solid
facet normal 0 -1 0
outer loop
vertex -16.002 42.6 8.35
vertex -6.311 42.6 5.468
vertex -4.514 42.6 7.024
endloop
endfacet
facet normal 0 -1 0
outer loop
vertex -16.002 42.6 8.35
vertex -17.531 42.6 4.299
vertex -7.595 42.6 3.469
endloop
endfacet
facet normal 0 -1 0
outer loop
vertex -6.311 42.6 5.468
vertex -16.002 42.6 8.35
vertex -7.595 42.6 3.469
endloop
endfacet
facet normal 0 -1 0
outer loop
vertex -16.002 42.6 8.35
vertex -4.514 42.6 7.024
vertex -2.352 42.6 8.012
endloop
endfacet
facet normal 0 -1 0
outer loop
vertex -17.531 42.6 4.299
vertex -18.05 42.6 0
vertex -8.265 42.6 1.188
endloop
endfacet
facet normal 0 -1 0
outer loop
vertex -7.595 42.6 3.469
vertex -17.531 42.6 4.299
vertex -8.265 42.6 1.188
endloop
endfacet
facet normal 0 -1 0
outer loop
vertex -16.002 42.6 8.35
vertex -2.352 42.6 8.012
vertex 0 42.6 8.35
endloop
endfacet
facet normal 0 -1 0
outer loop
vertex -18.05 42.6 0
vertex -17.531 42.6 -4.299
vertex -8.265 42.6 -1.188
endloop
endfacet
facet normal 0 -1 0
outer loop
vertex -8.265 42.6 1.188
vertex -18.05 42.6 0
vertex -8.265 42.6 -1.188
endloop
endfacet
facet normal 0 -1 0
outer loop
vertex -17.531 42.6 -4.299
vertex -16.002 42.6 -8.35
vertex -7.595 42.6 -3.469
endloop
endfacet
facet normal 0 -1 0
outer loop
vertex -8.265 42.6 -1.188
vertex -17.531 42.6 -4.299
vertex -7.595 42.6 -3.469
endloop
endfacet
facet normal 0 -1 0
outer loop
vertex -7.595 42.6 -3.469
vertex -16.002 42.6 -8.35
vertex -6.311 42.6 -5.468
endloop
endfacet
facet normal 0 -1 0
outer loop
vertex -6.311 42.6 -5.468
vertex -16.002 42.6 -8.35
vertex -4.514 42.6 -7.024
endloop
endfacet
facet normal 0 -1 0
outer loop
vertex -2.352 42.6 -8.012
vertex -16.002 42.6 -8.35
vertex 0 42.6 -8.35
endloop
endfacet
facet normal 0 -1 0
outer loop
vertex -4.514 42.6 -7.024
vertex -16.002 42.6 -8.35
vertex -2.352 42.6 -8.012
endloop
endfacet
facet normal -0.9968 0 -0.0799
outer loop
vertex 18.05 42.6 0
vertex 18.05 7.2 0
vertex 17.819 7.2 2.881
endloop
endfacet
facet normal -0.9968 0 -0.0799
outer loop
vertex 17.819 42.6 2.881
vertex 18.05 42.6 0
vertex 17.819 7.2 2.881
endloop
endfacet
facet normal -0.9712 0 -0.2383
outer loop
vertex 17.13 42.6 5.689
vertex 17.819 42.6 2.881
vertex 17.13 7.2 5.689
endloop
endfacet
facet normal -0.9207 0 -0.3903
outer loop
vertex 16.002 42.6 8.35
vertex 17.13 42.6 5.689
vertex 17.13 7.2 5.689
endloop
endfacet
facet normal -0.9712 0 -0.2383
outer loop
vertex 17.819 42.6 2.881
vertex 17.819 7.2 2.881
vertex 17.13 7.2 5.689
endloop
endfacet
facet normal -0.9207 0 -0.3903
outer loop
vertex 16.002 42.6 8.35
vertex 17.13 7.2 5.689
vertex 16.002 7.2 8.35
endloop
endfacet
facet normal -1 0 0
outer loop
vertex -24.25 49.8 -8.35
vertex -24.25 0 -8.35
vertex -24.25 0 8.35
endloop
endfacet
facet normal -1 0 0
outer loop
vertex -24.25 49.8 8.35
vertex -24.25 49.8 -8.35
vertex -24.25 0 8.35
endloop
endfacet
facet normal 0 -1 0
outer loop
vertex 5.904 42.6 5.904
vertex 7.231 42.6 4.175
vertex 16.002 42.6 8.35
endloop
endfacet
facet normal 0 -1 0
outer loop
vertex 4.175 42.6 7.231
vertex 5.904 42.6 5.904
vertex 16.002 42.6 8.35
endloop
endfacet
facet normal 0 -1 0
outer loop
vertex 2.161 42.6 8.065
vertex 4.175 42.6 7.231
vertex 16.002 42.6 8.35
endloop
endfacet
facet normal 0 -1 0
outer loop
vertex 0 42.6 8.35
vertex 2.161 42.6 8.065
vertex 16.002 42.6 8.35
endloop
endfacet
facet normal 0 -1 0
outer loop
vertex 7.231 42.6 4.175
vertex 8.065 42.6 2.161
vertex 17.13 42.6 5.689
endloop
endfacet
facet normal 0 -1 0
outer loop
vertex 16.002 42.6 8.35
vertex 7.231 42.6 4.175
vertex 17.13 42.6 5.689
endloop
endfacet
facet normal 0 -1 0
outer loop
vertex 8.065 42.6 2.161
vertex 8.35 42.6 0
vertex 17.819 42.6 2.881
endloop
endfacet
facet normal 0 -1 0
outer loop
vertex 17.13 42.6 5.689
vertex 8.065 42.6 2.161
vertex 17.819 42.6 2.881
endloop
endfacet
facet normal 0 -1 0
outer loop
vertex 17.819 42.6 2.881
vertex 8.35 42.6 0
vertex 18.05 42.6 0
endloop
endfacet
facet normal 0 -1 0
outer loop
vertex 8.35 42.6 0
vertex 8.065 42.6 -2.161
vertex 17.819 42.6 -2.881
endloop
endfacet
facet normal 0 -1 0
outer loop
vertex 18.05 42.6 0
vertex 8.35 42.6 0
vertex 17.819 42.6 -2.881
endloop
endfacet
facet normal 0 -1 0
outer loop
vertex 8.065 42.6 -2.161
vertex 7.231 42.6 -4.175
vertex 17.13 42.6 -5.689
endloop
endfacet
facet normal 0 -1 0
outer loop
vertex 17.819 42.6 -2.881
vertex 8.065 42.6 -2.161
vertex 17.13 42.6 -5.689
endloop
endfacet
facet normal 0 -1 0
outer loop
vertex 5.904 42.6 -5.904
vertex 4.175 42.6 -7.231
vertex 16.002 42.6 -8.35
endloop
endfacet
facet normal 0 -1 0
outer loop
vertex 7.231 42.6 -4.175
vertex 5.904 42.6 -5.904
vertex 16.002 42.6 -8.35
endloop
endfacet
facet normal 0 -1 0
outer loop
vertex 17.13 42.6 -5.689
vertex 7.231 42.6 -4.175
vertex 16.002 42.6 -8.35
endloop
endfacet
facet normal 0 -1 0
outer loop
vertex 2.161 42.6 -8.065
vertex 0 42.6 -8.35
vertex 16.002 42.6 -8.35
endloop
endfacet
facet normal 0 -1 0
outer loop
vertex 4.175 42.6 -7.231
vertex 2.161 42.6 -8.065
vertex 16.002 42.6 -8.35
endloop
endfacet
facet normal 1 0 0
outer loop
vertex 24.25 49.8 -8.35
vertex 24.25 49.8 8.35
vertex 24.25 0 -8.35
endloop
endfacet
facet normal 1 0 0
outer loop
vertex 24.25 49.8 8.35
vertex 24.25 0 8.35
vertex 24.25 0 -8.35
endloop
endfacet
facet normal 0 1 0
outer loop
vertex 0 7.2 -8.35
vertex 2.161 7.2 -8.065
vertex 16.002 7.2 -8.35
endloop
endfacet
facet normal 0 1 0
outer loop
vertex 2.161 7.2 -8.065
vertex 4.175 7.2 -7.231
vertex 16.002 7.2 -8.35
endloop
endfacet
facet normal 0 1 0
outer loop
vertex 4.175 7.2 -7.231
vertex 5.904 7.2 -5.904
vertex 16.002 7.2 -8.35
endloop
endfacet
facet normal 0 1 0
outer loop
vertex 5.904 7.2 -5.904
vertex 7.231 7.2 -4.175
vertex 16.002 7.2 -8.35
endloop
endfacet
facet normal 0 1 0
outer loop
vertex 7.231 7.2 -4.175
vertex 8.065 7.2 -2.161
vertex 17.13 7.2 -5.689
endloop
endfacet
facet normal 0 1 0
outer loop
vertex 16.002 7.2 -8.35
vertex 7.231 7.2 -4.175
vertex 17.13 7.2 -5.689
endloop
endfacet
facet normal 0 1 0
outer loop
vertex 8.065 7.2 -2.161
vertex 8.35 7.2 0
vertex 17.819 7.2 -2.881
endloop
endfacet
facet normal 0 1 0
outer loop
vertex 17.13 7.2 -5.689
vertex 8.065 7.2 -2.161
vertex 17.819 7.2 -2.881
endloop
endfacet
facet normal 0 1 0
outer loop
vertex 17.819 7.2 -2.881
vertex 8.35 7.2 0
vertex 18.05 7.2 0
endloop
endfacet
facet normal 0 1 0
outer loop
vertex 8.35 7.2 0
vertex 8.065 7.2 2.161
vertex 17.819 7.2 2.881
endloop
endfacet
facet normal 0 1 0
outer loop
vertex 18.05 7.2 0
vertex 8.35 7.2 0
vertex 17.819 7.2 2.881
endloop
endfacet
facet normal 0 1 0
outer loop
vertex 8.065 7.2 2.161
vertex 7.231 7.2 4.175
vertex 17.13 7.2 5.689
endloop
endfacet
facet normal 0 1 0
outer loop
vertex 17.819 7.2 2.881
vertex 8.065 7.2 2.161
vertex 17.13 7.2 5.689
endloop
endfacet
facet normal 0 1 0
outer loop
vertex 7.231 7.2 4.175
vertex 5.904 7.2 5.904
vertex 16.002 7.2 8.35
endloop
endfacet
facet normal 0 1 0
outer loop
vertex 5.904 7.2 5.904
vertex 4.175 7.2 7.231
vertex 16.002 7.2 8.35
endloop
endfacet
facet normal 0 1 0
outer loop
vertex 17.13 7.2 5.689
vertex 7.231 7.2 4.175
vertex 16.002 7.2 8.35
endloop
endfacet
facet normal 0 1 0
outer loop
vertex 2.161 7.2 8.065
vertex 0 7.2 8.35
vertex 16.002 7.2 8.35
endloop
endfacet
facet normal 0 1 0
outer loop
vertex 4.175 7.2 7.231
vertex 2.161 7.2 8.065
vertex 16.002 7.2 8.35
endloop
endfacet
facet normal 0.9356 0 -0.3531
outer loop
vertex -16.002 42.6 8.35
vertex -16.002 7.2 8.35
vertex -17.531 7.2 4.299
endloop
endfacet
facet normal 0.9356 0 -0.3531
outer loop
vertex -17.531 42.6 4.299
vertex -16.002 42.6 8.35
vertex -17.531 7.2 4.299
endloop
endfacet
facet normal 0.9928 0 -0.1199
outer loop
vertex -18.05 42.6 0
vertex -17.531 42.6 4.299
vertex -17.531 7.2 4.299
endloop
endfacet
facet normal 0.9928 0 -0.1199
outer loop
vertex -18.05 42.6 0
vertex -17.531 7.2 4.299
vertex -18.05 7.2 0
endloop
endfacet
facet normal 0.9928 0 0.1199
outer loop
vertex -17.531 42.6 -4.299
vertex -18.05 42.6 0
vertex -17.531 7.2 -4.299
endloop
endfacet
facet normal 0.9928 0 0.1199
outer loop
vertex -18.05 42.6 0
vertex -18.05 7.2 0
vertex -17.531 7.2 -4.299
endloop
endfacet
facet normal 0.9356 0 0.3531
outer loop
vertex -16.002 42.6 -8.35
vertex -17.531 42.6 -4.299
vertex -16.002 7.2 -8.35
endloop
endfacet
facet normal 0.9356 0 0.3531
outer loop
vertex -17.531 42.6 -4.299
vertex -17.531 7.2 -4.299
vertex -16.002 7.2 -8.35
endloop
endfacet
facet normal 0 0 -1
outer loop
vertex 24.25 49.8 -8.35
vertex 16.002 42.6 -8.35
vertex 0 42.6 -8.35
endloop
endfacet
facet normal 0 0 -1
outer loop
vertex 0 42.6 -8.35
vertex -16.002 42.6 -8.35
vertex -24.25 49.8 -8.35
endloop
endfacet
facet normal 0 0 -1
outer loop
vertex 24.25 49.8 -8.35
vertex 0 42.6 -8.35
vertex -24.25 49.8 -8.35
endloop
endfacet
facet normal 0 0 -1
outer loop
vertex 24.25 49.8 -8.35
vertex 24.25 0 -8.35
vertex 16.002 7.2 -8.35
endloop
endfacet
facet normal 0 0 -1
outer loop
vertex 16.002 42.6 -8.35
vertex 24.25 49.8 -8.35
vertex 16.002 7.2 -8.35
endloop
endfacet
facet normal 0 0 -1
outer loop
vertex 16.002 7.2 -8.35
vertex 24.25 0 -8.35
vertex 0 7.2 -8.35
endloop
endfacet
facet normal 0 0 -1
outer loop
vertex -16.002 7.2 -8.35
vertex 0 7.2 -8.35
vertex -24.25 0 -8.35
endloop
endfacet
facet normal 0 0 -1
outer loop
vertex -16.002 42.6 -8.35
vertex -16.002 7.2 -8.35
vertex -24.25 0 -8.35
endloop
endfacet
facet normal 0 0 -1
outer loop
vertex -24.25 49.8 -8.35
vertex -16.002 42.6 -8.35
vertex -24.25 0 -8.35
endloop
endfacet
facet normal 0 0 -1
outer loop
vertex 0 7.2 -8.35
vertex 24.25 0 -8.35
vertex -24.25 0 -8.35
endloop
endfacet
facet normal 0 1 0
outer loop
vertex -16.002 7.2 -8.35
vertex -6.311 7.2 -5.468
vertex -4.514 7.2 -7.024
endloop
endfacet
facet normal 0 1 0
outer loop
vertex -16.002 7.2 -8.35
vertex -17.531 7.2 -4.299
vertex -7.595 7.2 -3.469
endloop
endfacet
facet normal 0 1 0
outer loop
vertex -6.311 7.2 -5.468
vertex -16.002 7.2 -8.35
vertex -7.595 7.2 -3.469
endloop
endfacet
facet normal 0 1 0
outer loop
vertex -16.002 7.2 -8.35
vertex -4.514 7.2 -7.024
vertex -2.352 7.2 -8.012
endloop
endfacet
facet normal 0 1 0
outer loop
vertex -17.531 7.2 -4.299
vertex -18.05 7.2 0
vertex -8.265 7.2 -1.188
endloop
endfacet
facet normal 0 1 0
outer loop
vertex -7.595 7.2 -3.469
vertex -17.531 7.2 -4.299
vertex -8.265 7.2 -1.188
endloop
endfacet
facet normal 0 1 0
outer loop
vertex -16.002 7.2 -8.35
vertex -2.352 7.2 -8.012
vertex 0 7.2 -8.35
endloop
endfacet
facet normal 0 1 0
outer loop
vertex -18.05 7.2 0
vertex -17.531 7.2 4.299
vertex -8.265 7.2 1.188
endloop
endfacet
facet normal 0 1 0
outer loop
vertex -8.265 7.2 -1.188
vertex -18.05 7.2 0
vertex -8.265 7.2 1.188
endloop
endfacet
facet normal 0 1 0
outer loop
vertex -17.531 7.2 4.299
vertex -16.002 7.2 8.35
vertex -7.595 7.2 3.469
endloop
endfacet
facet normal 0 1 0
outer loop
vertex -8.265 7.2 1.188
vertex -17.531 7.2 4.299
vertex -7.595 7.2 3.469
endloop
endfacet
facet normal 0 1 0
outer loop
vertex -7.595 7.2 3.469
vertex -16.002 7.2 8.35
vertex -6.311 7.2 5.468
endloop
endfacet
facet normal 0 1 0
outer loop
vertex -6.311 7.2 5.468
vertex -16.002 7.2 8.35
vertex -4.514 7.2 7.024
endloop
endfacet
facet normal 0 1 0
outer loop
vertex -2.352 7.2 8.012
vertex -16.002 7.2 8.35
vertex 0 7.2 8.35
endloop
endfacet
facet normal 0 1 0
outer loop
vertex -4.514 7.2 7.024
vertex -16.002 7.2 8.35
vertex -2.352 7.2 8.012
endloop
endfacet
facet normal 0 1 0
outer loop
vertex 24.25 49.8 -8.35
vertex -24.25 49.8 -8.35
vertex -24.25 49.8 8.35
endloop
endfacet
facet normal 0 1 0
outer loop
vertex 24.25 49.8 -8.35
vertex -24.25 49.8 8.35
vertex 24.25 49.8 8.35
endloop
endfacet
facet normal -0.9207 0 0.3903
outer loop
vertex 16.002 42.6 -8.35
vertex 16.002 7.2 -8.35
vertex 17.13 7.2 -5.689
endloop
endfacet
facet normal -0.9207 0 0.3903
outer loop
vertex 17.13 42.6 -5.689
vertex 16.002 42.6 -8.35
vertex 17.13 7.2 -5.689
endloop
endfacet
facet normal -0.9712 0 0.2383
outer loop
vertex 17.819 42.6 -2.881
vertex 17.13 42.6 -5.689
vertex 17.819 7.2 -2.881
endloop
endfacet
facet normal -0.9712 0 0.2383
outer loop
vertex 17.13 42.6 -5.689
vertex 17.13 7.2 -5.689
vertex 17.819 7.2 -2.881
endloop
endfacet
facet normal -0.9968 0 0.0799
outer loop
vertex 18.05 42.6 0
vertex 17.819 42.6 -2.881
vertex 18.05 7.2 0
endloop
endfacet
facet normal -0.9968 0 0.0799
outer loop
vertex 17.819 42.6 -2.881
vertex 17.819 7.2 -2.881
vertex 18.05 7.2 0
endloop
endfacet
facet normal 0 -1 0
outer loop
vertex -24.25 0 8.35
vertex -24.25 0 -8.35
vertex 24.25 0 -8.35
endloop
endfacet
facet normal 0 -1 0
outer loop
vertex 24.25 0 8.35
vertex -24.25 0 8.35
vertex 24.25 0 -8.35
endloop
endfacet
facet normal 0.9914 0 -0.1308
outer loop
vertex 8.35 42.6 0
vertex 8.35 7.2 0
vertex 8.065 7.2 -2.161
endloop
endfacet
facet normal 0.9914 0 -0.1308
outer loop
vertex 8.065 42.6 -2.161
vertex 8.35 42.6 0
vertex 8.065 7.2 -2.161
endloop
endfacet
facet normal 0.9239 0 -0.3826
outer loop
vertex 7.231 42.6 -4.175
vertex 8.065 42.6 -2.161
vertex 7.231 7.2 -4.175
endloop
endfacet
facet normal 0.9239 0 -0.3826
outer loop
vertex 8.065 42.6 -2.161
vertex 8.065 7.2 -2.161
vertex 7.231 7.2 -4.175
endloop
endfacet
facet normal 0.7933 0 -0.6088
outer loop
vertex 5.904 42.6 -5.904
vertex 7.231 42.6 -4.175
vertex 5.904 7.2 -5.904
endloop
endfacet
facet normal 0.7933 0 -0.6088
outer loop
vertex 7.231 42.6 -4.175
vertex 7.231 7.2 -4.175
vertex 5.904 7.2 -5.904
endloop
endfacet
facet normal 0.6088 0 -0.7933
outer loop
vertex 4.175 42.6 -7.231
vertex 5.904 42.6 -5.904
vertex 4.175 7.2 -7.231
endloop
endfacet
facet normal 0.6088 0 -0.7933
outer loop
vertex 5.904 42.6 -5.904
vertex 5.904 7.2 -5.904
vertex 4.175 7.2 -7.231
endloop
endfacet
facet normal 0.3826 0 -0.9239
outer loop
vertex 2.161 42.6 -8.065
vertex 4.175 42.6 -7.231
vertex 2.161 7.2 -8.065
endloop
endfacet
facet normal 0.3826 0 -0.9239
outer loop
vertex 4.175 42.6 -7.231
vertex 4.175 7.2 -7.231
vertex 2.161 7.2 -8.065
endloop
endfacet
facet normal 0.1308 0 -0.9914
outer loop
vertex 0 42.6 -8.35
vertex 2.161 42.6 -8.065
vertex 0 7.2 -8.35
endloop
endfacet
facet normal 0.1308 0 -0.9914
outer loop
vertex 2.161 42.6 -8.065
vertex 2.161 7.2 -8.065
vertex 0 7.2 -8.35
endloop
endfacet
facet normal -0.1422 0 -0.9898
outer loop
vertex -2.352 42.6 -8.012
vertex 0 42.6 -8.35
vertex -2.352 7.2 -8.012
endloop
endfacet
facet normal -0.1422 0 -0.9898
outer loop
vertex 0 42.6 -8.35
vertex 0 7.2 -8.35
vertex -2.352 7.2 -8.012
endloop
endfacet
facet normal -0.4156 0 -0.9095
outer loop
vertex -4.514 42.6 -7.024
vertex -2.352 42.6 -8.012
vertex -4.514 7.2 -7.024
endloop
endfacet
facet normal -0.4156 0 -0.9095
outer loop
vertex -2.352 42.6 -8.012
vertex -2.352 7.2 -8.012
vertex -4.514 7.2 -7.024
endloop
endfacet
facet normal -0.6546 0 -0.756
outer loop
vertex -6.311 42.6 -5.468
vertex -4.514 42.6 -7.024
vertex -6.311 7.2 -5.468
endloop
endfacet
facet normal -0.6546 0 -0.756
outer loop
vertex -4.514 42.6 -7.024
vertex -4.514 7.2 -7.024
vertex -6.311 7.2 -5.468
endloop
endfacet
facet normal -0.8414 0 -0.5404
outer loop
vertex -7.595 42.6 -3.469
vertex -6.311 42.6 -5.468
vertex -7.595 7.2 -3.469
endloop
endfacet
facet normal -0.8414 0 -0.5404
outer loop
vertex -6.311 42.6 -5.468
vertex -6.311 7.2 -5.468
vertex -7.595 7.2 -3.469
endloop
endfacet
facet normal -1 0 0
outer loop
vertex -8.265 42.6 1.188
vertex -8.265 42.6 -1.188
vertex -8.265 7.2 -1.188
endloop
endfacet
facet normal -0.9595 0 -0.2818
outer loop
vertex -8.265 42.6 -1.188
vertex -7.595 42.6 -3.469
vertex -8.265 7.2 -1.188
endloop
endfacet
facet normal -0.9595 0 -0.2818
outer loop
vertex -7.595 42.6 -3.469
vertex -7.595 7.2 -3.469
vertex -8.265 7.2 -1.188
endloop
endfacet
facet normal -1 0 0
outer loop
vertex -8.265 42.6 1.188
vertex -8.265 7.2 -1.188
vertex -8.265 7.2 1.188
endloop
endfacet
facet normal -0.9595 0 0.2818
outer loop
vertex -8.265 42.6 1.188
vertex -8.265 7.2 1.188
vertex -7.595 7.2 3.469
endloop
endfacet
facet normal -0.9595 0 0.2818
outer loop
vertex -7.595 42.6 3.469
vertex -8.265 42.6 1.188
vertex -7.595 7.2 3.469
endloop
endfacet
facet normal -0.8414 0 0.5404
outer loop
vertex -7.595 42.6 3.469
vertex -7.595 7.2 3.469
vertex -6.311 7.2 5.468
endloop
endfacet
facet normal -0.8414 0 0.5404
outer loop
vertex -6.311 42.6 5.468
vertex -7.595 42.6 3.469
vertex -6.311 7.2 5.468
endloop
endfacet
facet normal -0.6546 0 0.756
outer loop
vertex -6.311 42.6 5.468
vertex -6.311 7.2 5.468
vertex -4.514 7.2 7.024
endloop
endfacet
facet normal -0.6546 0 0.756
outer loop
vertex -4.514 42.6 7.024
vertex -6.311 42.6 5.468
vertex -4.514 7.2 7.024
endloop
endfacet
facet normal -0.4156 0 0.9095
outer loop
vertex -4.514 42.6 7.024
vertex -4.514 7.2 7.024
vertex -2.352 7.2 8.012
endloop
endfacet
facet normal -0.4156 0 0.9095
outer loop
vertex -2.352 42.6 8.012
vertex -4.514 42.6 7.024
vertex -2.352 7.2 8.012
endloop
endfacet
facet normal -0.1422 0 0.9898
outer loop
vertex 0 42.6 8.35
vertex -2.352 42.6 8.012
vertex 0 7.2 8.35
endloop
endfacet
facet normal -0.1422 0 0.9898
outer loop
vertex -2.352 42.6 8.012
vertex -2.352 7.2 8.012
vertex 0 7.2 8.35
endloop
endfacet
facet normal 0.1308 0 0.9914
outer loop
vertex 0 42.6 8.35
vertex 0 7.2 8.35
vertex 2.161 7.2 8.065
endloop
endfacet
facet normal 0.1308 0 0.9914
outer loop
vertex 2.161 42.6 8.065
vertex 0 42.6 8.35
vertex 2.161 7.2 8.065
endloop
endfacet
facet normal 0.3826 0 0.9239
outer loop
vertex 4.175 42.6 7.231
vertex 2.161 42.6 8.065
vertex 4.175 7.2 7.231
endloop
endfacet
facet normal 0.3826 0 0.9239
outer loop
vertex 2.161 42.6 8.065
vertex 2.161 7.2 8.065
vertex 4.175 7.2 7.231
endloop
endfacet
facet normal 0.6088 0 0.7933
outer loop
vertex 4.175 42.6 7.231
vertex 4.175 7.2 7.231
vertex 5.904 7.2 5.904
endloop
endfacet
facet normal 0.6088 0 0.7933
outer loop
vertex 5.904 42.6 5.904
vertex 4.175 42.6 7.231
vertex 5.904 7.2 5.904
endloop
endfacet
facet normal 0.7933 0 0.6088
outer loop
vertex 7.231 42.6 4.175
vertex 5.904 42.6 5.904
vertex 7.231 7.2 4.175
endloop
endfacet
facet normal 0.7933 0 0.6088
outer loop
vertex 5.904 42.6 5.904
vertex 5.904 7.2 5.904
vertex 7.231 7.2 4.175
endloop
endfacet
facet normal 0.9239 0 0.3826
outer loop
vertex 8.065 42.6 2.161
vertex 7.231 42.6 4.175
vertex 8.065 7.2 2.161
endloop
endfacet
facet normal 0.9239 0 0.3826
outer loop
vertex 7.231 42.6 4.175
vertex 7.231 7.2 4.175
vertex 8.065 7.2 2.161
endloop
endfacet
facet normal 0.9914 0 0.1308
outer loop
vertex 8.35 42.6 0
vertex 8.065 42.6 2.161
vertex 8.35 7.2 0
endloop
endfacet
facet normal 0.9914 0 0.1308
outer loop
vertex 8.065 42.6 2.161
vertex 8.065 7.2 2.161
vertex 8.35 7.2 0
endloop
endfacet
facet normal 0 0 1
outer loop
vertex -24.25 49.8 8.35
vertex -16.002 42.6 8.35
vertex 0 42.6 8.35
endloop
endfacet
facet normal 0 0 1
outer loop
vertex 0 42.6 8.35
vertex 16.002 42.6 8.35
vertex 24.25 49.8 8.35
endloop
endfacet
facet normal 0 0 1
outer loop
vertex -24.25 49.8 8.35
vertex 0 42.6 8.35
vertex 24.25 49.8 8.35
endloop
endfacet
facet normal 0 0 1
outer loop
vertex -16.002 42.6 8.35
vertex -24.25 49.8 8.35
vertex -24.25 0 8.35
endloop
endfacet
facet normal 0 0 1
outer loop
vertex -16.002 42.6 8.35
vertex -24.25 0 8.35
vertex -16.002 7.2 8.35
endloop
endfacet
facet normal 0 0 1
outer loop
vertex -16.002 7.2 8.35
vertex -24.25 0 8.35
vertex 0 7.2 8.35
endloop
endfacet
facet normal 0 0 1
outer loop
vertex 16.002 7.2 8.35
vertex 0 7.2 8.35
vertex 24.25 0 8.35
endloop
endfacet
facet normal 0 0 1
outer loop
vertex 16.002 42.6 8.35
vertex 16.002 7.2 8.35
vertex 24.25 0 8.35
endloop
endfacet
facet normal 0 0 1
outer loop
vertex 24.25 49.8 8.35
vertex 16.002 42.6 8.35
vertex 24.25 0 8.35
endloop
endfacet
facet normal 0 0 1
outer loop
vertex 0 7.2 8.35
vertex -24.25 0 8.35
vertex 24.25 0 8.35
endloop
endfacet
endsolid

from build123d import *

# Parameters (mm, degrees)
BOSS_EXTRUDE1_DEPTH   = 49.8
SKETCH1_R             = 8.35
BOSS_EXTRUDE1_2_DEPTH = 49.8
BOSS_EXTRUDE1_3_DEPTH = 49.8
SKETCH2_W             = 48.5
SKETCH2_H             = 16.7
BOSS_EXTRUDE2_DEPTH   = 7.2
SKETCH3_W             = 48.5
SKETCH3_H             = 16.7
BOSS_EXTRUDE3_DEPTH   = 7.2


with BuildPart() as part:
    # Sketch1 → Boss-Extrude1 (new body)
    with BuildSketch(Plane(origin=(0, 0, 0), x_dir=(1, 0, 0), z_dir=(0, 1, 0))):
        with BuildLine():
            Line((-16.002499805, 8.35), (-24.25, 8.35))
            Line((-24.25, 8.35), (-24.25, -8.35))
            Line((-24.25, -8.35), (-16.002499805, -8.35))
            ThreePointArc((-16.002499805, -8.35), (-18.05, 0), (-16.002499805, 8.35))
        make_face()
    extrude(amount=BOSS_EXTRUDE1_DEPTH)



with BuildPart() as body_2:
    # Sketch1 → Boss-Extrude1 2 (new body)
    with BuildSketch(Plane(origin=(0, 0, 0), x_dir=(1, 0, 0), z_dir=(0, 1, 0))):
        Circle(SKETCH1_R)
    extrude(amount=BOSS_EXTRUDE1_2_DEPTH)


with BuildPart() as body_3:
    # Sketch1 → Boss-Extrude1 3 (new body)
    with BuildSketch(Plane(origin=(0, 0, 0), x_dir=(1, 0, 0), z_dir=(0, 1, 0))):
        with BuildLine():
            Line((24.25, 8.35), (16.002499805, 8.35))
            ThreePointArc((16.002499805, 8.35), (17.53065346, 4.298684597), (18.05, 0))
            ThreePointArc((18.05, 0), (17.53065346, -4.298684597), (16.002499805, -8.35))
            Line((16.002499805, -8.35), (24.25, -8.35))
            Line((24.25, -8.35), (24.25, 8.35))
        make_face()
    extrude(amount=BOSS_EXTRUDE1_3_DEPTH)


with BuildPart() as part_1:
    add(part.part)

    add(body_2.part)  # Boss-Extrude2 merges body 2

    add(body_3.part)  # Boss-Extrude2 merges body 3
    # Sketch2 → Boss-Extrude2 (add)
    with BuildSketch(Plane(origin=(0, 49.8, 0), x_dir=(1, 0, 0), z_dir=(0, 1, 0))):
        Rectangle(SKETCH2_W, SKETCH2_H)
    extrude(amount=-BOSS_EXTRUDE2_DEPTH)

    # Sketch3 → Boss-Extrude3 (add)
    with BuildSketch(Plane.XZ):
        Rectangle(SKETCH3_W, SKETCH3_H)
    extrude(amount=-BOSS_EXTRUDE3_DEPTH)


solid = part_1.part
